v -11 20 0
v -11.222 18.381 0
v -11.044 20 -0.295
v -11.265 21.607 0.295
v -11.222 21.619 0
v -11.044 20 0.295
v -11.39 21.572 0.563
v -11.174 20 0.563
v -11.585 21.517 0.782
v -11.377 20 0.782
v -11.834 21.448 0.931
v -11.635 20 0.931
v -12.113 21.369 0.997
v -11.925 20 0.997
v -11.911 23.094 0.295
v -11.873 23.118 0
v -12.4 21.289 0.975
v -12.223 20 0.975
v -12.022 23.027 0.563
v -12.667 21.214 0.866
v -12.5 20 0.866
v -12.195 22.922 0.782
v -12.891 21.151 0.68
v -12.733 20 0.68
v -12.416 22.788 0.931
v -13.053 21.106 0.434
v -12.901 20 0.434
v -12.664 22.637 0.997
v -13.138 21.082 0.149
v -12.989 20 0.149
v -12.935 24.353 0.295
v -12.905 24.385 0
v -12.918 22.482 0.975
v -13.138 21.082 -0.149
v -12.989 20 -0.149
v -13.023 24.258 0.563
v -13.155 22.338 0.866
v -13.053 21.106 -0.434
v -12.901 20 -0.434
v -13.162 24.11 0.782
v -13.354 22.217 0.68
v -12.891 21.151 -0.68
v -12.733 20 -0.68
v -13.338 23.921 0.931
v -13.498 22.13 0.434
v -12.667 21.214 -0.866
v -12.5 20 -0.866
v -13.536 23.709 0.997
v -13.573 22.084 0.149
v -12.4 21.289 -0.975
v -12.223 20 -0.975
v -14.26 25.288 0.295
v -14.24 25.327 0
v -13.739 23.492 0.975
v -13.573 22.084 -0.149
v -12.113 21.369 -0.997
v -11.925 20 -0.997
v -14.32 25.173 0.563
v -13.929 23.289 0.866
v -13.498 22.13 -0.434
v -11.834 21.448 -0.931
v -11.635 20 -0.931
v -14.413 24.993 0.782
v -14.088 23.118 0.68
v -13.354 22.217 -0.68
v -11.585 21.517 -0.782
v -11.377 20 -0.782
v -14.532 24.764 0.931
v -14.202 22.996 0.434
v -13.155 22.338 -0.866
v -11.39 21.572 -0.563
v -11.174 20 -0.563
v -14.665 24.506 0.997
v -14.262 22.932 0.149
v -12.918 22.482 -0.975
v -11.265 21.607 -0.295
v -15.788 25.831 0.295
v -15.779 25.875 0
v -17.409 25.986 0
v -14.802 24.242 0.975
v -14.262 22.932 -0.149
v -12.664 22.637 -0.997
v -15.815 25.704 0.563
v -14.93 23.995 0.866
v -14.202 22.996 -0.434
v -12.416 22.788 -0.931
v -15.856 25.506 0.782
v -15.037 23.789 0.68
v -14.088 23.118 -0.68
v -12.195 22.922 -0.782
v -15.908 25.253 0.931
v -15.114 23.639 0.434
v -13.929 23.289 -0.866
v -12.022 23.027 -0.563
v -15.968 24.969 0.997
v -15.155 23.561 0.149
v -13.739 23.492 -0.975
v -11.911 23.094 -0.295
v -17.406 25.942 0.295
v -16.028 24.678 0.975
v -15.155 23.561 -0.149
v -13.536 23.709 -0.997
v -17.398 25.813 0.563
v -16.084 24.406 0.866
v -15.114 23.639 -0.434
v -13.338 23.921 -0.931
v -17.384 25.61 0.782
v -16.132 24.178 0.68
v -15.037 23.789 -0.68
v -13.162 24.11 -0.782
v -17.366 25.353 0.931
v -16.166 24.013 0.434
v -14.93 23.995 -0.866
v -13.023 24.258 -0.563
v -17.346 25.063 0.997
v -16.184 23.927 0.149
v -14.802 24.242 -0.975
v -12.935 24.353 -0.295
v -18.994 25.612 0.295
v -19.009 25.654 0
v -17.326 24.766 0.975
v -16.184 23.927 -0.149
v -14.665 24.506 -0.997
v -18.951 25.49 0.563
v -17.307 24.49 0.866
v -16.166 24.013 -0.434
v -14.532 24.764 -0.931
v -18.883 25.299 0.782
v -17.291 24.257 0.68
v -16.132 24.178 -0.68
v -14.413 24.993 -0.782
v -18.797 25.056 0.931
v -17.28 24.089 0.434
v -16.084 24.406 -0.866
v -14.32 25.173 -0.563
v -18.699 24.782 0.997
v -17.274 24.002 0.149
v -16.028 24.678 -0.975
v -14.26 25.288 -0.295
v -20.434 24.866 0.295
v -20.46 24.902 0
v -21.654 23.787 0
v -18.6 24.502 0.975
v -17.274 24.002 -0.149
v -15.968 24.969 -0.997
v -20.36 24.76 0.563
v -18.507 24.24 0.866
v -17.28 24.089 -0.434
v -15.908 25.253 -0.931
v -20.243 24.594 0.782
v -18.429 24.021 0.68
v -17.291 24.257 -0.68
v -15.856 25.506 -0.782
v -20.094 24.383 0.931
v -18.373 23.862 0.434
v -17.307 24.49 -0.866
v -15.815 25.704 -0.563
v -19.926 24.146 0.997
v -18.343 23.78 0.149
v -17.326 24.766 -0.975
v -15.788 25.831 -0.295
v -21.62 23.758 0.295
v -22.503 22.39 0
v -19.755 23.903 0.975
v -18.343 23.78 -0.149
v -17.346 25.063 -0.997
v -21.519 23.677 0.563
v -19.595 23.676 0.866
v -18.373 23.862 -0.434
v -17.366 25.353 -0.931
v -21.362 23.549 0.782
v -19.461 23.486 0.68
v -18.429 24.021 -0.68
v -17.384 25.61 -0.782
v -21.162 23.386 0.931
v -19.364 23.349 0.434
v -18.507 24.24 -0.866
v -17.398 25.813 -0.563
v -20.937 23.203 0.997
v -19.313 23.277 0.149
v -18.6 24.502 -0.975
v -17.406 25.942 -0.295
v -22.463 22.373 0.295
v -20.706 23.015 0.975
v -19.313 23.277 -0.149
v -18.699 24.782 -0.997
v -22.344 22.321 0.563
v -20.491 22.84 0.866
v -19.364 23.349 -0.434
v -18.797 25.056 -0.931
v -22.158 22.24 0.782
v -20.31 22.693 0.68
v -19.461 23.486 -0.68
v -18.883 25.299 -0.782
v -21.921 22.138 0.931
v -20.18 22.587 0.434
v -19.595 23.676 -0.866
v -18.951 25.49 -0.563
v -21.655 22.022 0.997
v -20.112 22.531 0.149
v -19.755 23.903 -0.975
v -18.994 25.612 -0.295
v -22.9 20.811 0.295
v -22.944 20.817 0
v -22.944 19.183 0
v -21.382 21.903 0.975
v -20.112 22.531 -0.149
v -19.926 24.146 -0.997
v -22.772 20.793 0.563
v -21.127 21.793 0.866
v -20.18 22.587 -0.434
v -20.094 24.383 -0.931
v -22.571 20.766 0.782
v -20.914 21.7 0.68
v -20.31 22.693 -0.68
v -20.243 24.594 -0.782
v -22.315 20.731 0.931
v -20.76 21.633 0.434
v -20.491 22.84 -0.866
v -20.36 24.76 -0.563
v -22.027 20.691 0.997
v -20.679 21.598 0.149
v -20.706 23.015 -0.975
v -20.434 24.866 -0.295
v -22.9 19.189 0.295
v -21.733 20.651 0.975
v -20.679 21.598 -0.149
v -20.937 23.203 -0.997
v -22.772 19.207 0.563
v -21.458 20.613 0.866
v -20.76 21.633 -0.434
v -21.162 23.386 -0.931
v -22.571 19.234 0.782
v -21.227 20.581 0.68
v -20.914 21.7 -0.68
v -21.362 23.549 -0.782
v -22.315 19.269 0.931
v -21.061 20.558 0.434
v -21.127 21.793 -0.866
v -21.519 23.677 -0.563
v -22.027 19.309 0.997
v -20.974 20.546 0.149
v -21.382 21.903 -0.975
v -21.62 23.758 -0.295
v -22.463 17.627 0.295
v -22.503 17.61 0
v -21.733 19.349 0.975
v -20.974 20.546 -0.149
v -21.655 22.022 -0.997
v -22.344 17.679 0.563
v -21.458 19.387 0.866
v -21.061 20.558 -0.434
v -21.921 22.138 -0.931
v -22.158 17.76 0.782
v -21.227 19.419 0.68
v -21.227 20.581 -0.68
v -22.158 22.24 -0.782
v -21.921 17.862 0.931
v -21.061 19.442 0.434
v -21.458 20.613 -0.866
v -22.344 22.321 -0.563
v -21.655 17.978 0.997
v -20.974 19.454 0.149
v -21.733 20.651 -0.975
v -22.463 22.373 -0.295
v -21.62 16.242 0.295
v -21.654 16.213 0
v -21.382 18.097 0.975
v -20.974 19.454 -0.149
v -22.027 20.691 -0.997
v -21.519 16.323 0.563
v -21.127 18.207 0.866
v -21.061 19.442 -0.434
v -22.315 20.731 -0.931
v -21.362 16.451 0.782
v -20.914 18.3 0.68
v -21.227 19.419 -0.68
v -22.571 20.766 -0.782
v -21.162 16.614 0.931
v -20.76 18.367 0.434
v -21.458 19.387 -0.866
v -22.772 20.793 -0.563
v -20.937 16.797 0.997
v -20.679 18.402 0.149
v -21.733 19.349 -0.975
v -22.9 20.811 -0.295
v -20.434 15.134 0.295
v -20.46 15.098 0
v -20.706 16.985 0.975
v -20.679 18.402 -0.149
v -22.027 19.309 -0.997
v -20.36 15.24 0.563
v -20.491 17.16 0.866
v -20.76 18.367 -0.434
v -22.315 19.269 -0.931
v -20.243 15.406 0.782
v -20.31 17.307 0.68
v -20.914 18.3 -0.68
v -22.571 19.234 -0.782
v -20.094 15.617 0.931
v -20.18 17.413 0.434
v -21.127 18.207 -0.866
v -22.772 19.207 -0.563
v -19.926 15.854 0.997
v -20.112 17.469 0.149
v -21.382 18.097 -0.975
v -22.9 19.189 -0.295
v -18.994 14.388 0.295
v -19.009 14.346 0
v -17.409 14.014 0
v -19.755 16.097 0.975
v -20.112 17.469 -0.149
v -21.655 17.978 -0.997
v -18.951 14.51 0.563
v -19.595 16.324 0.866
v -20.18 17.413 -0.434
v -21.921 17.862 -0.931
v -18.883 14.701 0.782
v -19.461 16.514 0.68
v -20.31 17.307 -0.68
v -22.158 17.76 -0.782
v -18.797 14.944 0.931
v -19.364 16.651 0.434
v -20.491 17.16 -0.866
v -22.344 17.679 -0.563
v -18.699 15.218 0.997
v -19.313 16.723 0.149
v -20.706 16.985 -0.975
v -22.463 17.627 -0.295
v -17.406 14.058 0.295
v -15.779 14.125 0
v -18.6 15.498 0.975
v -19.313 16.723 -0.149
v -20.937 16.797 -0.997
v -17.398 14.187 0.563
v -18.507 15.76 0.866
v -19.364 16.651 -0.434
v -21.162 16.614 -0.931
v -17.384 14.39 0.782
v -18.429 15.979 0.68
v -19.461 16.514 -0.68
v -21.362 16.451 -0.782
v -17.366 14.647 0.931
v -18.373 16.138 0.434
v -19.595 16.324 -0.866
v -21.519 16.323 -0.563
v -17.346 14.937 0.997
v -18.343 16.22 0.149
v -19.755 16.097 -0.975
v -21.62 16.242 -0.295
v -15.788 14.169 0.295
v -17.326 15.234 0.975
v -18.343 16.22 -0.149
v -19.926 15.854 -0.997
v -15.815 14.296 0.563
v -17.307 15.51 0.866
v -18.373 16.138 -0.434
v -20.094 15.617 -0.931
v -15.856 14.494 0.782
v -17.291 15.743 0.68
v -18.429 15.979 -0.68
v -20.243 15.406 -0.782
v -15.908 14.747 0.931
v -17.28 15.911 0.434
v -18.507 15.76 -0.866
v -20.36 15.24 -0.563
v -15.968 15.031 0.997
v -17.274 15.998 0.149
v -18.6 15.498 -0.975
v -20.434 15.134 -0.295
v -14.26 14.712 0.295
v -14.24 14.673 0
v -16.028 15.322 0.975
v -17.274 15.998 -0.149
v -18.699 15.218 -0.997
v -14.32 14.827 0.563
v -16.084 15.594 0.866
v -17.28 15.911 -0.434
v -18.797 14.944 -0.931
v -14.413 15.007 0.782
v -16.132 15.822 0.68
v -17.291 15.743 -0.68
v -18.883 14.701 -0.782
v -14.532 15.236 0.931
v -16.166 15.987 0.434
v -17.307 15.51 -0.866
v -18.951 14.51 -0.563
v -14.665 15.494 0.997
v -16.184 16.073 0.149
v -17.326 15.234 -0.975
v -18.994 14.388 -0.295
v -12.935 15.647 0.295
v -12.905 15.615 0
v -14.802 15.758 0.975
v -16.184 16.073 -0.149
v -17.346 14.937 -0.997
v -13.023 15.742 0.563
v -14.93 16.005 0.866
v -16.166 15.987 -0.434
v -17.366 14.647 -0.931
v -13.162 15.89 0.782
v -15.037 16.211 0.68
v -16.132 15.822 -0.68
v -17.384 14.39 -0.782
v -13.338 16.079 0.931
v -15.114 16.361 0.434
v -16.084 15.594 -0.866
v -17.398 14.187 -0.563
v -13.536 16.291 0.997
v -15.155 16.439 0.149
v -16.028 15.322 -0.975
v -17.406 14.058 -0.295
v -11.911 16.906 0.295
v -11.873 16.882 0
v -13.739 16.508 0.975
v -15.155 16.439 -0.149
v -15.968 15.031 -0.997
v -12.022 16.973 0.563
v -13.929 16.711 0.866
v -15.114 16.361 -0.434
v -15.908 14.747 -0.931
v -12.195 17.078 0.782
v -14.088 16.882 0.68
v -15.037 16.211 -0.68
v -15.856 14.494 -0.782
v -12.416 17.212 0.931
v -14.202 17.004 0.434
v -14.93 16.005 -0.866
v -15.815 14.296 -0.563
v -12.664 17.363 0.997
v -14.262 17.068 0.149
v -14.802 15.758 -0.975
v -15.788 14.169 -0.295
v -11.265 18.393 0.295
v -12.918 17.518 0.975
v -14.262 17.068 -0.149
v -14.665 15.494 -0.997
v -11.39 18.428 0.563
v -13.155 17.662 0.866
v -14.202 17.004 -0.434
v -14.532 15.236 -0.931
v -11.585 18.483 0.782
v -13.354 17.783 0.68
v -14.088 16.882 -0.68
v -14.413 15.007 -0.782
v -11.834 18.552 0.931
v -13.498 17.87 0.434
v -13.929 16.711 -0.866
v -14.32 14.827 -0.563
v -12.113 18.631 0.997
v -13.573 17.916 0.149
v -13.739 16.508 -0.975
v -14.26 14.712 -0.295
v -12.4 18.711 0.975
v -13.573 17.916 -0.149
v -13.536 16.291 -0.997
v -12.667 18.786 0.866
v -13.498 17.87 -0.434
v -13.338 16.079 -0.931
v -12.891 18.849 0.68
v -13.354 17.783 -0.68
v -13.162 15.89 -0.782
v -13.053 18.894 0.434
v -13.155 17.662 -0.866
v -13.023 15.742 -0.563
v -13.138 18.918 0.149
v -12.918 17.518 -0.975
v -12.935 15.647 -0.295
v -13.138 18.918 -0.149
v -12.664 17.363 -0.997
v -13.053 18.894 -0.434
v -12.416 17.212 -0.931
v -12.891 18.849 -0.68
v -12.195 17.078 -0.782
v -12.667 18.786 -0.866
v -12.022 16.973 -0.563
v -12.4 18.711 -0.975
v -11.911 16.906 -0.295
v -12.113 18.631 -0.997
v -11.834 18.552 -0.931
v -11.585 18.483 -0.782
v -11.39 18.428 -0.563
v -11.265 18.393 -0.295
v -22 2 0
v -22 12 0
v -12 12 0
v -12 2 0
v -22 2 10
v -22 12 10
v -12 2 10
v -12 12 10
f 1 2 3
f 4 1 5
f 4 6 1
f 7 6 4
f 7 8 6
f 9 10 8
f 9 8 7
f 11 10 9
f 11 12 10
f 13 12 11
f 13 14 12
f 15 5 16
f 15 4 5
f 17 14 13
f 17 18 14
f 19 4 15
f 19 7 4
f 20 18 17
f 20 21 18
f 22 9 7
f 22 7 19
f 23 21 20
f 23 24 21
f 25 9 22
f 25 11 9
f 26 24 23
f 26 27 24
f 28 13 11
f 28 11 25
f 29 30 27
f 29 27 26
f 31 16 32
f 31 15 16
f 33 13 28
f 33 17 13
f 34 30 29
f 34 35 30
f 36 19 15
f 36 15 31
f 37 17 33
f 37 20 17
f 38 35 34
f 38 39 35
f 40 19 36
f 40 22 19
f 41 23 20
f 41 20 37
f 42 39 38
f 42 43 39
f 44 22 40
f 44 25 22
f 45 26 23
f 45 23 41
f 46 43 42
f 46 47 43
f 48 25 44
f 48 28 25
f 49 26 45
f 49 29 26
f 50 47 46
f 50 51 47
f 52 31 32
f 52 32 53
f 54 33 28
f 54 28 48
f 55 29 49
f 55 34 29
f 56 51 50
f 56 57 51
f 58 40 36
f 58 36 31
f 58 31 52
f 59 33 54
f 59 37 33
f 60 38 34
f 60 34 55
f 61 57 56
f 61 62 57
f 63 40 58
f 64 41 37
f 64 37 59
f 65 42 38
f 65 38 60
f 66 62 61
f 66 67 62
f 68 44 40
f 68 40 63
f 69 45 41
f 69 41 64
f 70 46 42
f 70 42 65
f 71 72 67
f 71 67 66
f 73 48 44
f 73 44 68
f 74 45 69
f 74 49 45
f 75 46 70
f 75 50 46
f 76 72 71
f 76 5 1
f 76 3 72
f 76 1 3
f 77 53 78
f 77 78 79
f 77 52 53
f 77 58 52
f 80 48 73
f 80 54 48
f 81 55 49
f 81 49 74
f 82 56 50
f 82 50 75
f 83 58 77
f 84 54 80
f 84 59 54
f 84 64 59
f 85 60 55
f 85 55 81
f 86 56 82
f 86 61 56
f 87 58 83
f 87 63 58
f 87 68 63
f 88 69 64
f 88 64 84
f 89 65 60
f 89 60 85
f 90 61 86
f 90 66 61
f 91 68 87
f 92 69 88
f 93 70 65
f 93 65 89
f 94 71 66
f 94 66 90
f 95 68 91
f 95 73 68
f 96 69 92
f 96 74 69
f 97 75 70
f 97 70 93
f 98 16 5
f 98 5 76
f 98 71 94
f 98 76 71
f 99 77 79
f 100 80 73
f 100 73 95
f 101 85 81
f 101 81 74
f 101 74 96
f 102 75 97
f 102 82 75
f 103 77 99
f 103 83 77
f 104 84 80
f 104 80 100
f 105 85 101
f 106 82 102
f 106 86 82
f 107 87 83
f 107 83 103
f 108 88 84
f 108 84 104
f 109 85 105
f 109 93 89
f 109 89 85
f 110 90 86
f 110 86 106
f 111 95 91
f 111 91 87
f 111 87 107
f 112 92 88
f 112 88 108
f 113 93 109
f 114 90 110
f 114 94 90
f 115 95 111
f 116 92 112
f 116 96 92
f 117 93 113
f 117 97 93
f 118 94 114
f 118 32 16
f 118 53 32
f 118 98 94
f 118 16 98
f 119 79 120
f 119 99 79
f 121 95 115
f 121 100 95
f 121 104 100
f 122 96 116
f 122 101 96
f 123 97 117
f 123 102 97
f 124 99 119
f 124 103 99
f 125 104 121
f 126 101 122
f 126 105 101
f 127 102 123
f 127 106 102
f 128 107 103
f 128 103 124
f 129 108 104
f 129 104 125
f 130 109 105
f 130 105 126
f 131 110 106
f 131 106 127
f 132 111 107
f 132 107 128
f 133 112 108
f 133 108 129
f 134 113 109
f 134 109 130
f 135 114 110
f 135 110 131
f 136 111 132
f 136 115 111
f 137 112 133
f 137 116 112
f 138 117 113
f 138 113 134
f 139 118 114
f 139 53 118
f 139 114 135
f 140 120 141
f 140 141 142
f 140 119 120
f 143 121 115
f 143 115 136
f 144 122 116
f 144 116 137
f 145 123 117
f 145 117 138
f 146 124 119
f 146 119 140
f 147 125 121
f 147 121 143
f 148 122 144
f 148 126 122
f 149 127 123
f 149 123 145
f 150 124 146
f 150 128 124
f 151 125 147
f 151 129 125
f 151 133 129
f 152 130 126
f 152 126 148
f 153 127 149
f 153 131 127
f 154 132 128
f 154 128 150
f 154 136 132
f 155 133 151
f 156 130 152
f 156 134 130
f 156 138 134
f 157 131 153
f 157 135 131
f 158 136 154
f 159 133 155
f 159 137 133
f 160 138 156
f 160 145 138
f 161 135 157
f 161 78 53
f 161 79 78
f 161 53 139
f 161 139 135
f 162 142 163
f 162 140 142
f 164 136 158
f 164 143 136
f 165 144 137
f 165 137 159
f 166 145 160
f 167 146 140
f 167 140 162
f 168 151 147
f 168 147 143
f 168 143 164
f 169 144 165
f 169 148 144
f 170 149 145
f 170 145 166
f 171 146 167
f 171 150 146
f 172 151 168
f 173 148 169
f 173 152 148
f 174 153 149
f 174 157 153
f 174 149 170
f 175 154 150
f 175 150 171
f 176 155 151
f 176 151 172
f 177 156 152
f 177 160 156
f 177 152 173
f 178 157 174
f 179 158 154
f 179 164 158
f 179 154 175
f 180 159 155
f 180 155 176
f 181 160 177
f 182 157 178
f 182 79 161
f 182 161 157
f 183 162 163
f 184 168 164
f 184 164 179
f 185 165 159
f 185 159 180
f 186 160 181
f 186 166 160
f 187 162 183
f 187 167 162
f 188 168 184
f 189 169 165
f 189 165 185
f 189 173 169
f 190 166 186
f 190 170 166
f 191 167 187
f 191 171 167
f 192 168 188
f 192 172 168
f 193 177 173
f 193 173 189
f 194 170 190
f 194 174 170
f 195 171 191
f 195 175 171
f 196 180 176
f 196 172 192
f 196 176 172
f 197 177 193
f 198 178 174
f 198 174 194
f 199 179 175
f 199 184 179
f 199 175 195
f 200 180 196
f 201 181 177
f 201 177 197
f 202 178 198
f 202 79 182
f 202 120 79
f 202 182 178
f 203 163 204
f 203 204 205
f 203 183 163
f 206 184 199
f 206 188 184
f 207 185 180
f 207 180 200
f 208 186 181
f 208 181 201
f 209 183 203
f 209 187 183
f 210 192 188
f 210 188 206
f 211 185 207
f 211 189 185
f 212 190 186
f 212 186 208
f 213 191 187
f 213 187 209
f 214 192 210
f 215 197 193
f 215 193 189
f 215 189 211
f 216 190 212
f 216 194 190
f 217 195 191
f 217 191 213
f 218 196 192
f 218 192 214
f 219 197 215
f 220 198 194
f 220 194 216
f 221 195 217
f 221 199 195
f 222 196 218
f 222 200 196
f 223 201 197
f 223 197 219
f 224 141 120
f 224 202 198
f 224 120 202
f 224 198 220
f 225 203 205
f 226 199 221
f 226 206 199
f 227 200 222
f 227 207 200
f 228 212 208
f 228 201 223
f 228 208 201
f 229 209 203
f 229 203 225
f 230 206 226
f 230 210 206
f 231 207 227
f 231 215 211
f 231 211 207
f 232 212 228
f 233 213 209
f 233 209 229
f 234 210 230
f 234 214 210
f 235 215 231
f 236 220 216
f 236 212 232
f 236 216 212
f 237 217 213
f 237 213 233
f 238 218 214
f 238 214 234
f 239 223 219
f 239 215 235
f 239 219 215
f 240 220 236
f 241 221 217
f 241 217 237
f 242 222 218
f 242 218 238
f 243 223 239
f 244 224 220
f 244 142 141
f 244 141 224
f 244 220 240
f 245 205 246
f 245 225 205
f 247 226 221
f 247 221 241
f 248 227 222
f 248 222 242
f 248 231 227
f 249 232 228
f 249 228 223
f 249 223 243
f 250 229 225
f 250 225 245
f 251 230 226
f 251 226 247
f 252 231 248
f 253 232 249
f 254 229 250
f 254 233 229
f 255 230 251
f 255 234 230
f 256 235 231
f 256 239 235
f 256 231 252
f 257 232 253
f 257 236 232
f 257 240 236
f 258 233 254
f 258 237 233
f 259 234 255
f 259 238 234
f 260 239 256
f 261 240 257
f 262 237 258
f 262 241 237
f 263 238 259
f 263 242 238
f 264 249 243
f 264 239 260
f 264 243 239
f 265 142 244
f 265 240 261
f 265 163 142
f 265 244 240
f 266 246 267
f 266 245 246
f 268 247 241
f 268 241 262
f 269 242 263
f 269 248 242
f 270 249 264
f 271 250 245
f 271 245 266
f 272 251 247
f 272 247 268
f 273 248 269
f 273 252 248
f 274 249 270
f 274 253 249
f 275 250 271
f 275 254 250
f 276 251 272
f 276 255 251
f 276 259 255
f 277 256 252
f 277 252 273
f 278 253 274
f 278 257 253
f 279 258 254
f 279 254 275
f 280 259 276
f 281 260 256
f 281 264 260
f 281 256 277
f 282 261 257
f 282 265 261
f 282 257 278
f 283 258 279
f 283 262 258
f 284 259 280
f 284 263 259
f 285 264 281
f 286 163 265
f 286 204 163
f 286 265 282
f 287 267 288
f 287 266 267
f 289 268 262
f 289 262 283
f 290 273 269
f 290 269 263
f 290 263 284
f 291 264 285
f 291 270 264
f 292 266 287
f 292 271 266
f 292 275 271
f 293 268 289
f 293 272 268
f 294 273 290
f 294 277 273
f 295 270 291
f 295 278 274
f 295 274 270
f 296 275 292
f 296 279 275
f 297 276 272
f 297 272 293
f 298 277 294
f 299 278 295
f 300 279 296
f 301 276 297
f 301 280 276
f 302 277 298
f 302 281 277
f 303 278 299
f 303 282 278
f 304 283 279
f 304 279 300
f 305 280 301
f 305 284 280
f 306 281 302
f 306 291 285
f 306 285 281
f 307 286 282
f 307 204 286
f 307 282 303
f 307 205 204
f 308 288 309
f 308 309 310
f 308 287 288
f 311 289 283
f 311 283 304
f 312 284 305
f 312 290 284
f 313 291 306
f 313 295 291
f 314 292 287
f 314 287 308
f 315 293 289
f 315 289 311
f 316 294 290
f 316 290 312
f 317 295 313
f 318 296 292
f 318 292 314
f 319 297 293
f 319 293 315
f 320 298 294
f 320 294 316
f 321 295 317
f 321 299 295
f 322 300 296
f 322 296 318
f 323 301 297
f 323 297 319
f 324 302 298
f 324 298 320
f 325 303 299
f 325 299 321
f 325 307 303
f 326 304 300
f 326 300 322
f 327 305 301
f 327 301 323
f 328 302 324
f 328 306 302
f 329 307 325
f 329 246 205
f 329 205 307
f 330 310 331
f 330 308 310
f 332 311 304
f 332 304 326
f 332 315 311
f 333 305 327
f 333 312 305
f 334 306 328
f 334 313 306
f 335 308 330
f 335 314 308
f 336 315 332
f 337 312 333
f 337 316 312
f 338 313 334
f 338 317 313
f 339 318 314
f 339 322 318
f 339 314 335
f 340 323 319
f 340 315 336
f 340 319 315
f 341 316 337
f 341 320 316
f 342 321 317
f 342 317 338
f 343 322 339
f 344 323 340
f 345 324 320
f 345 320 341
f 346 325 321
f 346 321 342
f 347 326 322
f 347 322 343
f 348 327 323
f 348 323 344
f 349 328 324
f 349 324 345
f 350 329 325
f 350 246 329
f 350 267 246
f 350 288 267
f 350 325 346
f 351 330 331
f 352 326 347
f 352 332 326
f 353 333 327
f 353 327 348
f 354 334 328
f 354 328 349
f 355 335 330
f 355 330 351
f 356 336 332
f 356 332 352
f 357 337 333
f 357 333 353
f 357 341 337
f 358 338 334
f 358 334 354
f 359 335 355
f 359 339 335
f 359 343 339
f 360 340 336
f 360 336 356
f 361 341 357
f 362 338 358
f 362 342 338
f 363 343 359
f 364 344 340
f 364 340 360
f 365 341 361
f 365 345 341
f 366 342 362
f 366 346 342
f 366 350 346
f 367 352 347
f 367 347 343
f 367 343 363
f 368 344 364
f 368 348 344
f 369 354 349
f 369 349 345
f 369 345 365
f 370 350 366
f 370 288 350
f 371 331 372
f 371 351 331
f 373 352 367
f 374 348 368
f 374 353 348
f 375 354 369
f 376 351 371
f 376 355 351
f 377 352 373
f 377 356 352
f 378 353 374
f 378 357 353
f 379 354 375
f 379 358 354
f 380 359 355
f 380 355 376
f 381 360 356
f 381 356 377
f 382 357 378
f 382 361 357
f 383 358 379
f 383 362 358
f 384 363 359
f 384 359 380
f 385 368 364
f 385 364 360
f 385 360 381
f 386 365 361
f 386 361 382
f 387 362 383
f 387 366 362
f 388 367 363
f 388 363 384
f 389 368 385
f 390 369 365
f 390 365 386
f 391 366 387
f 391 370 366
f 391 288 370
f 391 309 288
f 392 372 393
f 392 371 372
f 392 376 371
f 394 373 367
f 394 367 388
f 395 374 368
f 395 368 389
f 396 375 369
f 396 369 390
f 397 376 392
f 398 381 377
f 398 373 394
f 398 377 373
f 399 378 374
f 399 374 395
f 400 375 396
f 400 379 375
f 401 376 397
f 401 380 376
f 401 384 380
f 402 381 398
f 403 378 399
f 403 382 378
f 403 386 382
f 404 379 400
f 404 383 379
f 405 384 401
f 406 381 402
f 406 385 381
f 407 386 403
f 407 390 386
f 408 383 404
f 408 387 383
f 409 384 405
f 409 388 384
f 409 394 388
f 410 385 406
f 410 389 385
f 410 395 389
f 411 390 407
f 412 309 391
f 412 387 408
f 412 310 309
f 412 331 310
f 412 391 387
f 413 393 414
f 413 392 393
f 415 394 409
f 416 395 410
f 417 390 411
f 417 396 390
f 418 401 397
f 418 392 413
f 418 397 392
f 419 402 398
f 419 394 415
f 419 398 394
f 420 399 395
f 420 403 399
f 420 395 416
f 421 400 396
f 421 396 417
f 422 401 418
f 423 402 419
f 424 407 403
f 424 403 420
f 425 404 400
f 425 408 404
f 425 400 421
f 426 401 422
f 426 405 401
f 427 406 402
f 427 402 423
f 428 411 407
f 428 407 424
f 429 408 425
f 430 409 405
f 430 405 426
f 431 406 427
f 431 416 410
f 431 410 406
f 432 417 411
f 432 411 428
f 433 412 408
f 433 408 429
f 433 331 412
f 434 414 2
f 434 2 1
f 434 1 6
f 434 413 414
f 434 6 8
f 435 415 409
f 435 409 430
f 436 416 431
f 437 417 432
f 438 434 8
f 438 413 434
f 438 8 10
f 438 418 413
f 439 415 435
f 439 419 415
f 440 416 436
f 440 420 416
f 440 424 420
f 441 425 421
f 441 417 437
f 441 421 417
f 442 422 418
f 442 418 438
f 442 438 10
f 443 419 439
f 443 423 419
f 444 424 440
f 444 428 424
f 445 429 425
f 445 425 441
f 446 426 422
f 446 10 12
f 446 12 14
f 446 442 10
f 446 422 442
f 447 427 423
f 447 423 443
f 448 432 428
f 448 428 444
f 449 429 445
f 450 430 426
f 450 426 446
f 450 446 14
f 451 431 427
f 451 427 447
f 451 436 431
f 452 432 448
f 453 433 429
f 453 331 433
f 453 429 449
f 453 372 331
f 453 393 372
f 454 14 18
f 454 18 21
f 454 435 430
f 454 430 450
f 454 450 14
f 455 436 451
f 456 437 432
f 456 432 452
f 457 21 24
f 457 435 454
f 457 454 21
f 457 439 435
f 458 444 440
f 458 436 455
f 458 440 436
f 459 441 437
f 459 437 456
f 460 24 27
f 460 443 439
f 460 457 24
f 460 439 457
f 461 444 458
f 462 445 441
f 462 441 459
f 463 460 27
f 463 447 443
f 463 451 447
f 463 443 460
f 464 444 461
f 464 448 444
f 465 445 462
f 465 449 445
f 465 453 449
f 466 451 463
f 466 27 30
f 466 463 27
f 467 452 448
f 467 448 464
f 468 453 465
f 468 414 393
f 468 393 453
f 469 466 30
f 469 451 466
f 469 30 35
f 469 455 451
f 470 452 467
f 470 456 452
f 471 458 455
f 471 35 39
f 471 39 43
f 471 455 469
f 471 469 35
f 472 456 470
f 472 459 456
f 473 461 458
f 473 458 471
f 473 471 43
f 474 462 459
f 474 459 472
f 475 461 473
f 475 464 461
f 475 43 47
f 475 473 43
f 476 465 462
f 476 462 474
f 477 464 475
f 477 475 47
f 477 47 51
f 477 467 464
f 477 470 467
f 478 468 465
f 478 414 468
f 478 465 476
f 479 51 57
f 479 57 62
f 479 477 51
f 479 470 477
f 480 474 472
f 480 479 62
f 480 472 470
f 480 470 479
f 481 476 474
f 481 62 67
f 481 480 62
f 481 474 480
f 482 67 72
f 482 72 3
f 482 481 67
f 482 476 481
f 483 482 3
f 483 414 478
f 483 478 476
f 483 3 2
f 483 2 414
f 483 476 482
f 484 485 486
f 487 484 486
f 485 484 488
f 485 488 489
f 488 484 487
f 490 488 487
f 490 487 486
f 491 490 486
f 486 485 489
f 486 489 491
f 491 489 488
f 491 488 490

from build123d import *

# Parameters (mm, degrees)
BOX_W     = 10
BOX_H     = 10
BOX_DEPTH = 10
TORUS_R   = 1


with BuildPart() as cube_passthrough:
    # Box → Box (new body)
    with BuildSketch(Plane(origin=(-22, 2, 0), x_dir=(1, 0, 0), z_dir=(0, 0, 1))):
        with Locations((5, 5)):
            Rectangle(BOX_W, BOX_H)
    extrude(amount=BOX_DEPTH)


with BuildPart() as trash_to_ignore:
    # Torus → Torus (revolve)
    with BuildSketch(Plane(origin=(-17, 20, 0), x_dir=(1, 0, 0), z_dir=(0, -1, 0))):
        with Locations((5, 0)):
            Circle(TORUS_R)
    revolve(axis=Axis((-17, 20, 0), (0, 0, 1)))


solid = Compound([cube_passthrough.part, trash_to_ignore.part])
